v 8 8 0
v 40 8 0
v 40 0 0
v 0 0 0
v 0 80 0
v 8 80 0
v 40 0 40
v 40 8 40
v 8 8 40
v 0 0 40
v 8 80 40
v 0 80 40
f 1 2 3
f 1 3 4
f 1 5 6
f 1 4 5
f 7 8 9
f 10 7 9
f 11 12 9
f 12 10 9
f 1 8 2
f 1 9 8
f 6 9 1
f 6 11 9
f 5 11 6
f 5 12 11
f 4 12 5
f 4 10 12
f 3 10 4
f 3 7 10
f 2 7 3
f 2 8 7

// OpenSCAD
$fn = 32;

// ----------------------------------------------------------------------
// Structural section: angle 40 x 80 mm
// ----------------------------------------------------------------------

// --- parameters (mm) ---
sec_w = 40;               // leg width, X
sec_h = 80;               // leg height, Y
flange_t = 8;             // leg thickness
plate_t = 40;             // cut length, Z (extrusion height)
fit_tol = 0.02;           // declared fit tolerance (prompt contract)
free_tol = 0.2;           // declared free tolerance (prompt contract)

profile = [[0, 0], [40, 0], [40, 8], [8, 8], [8, 80], [0, 80]];  // primary outline, 6 points, counter clockwise

// --- the one profile operation ---
linear_extrude(height = plate_t) polygon(points = profile);
